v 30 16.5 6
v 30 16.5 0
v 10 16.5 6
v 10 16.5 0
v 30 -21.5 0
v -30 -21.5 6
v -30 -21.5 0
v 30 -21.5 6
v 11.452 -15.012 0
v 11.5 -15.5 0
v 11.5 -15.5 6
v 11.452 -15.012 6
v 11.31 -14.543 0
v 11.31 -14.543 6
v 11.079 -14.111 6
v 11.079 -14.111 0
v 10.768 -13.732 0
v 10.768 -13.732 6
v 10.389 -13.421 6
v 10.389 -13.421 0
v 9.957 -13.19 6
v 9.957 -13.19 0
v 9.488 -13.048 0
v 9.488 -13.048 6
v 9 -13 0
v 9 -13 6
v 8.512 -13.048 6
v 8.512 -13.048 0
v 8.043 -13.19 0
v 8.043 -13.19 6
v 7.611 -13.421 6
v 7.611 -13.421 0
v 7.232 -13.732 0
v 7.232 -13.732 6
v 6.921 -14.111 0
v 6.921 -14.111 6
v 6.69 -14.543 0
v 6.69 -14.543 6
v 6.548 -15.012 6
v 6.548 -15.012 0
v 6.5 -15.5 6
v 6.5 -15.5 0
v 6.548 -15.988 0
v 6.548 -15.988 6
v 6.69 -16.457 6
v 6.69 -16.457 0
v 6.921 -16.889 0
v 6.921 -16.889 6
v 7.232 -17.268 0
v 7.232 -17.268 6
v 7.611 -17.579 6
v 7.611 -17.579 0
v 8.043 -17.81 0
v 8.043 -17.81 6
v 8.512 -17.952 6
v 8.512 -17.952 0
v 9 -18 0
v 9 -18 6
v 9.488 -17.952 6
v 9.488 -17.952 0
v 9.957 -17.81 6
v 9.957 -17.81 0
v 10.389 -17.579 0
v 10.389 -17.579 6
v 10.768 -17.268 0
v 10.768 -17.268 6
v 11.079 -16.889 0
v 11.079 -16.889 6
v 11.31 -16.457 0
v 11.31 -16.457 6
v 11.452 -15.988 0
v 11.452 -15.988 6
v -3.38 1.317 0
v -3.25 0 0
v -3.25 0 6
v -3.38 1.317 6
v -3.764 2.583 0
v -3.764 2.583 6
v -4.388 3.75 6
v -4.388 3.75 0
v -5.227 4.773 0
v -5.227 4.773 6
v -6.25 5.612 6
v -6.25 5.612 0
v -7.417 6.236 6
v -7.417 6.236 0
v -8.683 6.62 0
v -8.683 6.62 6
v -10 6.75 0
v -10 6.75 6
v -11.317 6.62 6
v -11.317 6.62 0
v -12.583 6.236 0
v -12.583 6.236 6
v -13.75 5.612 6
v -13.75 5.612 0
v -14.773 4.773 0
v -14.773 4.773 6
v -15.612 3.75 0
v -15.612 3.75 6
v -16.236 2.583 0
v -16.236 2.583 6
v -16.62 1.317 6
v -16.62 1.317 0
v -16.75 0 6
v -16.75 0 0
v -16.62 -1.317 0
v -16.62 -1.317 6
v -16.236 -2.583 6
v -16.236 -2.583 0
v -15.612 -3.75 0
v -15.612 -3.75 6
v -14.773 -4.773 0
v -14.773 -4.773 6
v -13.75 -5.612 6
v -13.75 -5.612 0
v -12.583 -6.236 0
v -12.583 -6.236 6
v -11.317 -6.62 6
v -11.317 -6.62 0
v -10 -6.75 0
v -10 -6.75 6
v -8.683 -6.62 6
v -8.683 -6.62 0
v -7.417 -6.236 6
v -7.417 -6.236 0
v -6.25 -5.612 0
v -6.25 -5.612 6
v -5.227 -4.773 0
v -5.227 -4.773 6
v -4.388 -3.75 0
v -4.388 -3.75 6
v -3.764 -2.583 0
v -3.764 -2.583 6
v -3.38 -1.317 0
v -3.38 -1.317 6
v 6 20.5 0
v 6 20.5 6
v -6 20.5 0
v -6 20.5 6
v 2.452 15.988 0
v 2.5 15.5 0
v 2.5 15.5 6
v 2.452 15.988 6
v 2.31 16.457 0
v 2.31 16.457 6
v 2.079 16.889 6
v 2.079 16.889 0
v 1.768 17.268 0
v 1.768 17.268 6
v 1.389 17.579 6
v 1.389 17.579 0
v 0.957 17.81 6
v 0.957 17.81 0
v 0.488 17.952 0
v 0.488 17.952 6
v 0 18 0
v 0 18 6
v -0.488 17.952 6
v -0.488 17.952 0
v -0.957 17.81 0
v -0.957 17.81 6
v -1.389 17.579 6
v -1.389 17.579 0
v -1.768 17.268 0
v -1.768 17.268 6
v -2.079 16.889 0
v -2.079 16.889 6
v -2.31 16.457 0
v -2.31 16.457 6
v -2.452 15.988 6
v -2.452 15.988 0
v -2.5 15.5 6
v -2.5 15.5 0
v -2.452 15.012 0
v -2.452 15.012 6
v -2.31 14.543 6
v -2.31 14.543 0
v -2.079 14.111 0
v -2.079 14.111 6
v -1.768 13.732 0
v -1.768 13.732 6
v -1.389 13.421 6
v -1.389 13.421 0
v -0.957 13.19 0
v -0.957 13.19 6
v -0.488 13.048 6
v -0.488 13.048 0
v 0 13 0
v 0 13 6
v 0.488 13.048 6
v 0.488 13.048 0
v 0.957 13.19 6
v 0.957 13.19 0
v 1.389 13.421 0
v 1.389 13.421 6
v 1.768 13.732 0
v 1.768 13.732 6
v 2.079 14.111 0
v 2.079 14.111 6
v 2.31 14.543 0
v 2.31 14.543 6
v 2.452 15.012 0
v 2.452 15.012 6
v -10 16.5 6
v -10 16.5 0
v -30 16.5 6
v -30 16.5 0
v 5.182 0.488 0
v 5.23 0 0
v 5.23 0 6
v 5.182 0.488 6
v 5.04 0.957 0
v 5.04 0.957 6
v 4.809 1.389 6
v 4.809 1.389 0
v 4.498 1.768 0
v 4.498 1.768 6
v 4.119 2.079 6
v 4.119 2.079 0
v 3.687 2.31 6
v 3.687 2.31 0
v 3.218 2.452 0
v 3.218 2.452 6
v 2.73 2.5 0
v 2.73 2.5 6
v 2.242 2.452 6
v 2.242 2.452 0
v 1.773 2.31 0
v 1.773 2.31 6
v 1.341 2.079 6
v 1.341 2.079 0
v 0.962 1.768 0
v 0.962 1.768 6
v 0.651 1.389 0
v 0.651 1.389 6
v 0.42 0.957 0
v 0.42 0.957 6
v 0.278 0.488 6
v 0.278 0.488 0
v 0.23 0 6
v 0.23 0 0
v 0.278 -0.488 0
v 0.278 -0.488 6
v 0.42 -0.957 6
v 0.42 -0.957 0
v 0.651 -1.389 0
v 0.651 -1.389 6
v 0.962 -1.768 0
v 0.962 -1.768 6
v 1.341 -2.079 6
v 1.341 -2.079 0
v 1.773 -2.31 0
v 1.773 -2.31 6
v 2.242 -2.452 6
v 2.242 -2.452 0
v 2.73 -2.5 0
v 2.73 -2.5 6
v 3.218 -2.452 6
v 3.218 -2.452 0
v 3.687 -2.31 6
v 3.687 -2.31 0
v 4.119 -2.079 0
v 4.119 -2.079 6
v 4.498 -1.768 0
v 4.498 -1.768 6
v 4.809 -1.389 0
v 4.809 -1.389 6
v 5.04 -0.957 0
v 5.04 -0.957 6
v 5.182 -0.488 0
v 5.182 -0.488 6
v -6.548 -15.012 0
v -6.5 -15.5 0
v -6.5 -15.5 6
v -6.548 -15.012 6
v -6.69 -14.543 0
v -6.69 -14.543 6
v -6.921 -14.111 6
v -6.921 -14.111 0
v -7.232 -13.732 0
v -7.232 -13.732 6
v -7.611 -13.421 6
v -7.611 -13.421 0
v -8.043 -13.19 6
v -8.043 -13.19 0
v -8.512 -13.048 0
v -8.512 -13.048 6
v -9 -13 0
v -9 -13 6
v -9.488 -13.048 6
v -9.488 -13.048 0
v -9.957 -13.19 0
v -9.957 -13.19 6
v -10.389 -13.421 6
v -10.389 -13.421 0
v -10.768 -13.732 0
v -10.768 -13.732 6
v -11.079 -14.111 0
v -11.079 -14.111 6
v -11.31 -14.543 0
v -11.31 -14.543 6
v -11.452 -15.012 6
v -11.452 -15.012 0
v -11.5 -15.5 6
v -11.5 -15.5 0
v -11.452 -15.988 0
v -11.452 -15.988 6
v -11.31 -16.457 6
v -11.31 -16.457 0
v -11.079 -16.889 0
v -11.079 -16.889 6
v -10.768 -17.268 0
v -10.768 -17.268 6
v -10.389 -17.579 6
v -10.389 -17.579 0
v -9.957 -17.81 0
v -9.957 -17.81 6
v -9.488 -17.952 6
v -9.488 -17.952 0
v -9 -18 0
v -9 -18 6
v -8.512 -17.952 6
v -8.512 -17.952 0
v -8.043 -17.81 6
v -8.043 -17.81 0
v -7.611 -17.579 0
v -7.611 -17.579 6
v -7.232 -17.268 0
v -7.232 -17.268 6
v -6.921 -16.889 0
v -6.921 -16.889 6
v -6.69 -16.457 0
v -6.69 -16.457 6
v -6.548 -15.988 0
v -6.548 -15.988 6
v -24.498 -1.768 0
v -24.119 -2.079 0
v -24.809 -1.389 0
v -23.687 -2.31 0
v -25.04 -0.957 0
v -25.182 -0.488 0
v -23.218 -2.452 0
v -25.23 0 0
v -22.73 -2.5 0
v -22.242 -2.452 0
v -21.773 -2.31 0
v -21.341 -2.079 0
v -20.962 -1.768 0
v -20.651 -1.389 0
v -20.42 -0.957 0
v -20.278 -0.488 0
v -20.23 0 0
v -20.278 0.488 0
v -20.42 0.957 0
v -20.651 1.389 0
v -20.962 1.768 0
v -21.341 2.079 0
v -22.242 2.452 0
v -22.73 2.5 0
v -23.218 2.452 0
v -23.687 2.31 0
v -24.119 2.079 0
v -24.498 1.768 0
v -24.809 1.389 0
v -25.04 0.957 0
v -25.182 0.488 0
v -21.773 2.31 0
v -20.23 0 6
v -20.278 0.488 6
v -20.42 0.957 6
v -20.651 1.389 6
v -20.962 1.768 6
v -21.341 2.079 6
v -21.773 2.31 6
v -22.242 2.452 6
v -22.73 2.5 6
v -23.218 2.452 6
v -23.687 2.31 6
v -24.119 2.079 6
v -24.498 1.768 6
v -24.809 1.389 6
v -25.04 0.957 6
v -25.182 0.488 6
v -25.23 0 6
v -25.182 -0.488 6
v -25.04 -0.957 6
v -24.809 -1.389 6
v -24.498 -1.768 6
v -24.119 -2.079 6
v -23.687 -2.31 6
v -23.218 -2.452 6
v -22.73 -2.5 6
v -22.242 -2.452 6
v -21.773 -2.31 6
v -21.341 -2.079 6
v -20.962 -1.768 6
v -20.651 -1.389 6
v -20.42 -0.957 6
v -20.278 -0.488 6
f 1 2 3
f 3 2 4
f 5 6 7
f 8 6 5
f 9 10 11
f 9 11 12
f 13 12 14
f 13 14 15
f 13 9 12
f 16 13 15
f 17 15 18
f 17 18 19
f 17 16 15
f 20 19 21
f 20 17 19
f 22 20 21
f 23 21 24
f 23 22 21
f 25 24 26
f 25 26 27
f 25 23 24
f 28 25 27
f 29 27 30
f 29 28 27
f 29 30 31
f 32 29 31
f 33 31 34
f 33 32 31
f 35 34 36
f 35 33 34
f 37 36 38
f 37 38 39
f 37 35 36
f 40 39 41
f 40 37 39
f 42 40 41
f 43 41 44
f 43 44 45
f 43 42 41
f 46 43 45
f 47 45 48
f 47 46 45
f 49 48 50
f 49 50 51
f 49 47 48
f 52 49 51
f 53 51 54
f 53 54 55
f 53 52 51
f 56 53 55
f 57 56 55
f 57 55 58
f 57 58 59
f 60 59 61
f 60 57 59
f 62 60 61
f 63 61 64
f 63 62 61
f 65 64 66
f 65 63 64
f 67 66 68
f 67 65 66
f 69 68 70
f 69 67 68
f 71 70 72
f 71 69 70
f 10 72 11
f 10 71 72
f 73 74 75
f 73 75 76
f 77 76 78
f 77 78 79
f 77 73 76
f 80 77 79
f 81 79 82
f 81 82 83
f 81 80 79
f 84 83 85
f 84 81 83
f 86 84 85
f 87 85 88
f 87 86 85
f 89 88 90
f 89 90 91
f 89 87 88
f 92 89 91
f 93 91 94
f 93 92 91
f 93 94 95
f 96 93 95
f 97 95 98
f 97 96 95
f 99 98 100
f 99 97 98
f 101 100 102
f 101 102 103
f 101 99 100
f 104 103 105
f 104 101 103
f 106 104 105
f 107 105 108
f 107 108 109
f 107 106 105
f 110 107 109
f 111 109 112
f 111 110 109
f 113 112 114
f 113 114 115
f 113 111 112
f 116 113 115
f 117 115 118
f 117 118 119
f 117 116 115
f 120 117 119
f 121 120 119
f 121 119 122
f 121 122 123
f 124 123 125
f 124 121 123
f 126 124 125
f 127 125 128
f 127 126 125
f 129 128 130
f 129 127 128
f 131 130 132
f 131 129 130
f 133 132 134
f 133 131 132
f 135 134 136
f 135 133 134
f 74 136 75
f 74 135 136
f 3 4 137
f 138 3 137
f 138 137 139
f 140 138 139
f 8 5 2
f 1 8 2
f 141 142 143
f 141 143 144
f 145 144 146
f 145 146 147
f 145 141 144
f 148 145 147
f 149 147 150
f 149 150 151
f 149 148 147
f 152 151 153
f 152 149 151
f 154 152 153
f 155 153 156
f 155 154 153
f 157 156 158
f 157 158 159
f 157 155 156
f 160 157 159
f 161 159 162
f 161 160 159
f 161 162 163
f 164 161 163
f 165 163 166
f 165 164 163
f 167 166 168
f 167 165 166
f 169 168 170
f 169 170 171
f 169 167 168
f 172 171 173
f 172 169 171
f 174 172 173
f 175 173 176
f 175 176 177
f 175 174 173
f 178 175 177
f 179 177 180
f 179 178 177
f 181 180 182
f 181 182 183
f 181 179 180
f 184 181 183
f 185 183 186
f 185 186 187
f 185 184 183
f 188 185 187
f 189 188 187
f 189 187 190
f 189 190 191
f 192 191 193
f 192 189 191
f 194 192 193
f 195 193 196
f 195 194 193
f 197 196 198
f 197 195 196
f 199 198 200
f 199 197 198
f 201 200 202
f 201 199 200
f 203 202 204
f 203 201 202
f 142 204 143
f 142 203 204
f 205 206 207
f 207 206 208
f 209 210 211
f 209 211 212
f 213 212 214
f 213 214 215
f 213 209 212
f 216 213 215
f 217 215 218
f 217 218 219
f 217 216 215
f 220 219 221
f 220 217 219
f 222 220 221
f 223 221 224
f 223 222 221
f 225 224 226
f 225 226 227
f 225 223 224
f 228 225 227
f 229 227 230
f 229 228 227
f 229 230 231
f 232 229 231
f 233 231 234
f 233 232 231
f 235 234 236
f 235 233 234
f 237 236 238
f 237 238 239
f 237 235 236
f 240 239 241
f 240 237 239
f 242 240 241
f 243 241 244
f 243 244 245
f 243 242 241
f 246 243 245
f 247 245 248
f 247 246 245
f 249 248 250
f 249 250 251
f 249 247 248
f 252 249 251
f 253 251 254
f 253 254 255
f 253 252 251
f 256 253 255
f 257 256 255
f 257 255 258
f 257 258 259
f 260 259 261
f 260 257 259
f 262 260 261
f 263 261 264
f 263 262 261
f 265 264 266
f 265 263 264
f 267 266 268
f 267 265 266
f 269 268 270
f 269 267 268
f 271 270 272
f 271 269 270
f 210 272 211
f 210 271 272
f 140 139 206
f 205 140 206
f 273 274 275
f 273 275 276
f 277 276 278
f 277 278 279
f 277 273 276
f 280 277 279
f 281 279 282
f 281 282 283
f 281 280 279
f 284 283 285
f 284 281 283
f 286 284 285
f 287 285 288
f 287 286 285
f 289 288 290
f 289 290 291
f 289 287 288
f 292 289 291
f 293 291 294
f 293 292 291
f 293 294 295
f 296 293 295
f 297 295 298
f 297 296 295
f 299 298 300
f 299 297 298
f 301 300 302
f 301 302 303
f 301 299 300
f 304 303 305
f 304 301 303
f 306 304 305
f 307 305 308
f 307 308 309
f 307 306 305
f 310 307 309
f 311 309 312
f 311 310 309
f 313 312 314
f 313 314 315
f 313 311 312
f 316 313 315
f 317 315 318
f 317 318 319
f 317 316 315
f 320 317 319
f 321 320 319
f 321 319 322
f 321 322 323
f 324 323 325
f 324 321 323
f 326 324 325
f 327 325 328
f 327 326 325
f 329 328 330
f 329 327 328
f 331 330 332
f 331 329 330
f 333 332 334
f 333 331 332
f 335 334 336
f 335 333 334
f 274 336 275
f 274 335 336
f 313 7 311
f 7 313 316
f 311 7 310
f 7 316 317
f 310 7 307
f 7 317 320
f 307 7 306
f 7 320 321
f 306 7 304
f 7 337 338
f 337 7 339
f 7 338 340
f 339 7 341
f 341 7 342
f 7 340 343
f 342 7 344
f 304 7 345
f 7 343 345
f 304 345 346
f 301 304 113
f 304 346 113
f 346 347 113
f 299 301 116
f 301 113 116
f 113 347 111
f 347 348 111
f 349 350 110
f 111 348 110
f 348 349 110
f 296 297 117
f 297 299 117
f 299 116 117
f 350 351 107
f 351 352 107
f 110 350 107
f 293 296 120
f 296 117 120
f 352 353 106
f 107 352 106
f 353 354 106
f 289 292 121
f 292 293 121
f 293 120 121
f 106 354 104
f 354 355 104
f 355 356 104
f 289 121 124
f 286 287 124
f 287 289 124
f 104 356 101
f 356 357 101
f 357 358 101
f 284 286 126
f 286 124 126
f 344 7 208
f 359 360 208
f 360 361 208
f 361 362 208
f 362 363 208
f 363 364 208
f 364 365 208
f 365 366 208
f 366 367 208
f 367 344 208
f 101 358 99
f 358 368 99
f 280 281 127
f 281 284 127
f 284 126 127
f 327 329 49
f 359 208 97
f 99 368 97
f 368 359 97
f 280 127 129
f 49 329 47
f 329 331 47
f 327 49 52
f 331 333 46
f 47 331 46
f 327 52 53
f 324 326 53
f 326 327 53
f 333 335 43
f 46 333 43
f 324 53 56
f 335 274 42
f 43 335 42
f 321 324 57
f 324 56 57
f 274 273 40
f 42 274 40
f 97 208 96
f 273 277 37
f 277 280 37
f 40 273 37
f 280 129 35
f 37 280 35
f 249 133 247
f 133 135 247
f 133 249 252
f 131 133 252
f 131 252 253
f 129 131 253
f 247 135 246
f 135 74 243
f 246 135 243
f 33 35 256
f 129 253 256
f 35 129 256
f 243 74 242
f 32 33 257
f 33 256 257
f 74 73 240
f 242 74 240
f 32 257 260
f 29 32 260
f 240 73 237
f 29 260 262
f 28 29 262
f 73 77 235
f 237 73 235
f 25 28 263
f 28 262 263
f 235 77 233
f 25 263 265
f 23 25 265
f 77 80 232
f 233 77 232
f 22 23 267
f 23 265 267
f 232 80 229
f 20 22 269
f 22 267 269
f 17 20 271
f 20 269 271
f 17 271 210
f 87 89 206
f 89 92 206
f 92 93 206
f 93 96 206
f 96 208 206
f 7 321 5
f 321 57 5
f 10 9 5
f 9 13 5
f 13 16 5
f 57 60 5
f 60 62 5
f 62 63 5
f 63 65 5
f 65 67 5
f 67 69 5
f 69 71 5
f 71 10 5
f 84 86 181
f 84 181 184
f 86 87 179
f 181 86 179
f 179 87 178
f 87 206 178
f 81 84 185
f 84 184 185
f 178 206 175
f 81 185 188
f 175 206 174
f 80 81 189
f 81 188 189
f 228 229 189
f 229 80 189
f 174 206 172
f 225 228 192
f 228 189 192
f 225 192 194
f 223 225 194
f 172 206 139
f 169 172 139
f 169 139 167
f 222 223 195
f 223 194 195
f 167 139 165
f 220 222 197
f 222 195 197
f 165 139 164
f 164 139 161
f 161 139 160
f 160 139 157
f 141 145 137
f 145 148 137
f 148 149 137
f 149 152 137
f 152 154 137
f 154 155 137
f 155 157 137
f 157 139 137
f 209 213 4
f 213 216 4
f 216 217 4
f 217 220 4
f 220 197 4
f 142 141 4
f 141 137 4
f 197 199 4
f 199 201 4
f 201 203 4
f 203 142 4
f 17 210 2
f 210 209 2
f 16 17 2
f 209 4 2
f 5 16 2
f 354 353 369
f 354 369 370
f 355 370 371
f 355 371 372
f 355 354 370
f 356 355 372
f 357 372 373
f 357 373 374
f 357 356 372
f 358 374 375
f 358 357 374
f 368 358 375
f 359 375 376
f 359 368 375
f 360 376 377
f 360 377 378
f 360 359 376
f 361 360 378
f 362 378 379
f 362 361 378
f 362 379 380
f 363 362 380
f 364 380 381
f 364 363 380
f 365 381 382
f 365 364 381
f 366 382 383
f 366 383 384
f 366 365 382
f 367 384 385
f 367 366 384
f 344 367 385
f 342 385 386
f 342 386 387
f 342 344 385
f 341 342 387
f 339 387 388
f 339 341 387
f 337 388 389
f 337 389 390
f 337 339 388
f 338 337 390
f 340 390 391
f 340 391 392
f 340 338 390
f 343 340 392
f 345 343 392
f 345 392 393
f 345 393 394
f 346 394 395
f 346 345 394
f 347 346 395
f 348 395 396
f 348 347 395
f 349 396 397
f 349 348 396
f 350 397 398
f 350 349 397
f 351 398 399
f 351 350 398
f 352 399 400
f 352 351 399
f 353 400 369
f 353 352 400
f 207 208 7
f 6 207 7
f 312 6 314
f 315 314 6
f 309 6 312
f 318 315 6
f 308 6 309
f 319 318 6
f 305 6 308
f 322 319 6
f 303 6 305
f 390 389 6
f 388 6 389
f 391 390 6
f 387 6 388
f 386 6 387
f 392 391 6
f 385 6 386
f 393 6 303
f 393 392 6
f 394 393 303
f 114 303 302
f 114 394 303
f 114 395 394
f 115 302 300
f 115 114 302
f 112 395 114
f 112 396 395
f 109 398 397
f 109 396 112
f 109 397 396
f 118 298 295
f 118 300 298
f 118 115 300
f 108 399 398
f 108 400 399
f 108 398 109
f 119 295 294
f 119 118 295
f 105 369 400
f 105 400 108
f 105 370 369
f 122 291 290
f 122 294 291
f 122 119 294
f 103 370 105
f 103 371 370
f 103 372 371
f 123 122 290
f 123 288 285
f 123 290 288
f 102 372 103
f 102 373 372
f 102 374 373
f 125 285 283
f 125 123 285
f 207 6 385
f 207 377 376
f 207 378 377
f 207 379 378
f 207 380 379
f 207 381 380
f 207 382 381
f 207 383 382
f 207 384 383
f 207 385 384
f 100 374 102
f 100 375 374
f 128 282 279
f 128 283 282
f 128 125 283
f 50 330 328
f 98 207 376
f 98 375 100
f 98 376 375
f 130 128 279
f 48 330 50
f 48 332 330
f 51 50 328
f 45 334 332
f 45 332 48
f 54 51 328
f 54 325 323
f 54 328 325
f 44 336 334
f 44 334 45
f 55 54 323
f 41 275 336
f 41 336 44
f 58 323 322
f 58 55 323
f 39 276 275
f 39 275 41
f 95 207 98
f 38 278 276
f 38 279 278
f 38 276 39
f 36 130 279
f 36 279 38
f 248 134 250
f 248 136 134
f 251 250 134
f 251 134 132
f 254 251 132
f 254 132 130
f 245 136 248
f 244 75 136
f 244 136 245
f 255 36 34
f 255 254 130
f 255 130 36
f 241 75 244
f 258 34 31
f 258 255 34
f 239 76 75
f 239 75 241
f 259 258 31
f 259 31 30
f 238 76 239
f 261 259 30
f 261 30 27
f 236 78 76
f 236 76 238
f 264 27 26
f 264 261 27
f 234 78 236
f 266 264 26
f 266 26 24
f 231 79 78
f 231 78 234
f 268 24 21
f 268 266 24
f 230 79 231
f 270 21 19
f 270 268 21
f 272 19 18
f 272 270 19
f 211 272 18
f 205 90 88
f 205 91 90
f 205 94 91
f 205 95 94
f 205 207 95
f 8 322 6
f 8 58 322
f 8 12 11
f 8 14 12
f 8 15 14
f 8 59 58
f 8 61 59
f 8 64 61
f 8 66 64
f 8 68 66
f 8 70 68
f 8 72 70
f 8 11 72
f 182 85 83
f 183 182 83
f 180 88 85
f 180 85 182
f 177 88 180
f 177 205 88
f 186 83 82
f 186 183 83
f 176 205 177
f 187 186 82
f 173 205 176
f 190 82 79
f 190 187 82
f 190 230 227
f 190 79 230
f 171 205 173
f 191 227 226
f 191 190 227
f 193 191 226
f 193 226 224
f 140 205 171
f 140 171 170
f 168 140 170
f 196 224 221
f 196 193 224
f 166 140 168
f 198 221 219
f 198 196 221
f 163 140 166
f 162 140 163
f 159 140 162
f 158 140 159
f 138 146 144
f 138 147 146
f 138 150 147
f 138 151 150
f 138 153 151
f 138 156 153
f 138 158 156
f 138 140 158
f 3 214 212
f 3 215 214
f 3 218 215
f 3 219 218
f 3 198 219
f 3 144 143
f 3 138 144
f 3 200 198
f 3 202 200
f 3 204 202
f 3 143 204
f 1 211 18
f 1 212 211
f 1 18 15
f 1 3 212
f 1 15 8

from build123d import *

# Parameters (mm, degrees)
F0_R      = 2.5
F0_W      = 40
F0_H      = 21
F0_R_2    = 6.75
F1_DEPTH  = 6
F1_FACE_W = 60
F1_FACE_H = 6
F2_DEPTH  = 1


with BuildPart() as f1:
    # F0 (on Top) → F1 (new body)
    with BuildSketch(Plane.XY):
        Polygon((30, 16.5), (20, 16.5), (10, 16.5), (6, 20.5), (-6, 20.5), (-10, 16.5), (-20, 16.5), (-30, 16.5), (-30, 10.5), (-30, -10.5), (-30, -22.5), (-20, -22.5), (20, -22.5), (30, -22.5), (30, -10.5), (30, 10.5), align=None)
        with Locations((-9, -15.5)):
            Circle(F0_R, mode=Mode.SUBTRACT)
        with Locations((9, -15.5)):
            Circle(F0_R, mode=Mode.SUBTRACT)
        with Locations((-22.73, 0)):
            Circle(F0_R, mode=Mode.SUBTRACT)
        Rectangle(F0_W, F0_H, mode=Mode.SUBTRACT)
        with Locations((0, 15.5)):
            Circle(F0_R, mode=Mode.SUBTRACT)
        Rectangle(F0_W, F0_H)
        with Locations((-10, 0)):
            Circle(F0_R_2, mode=Mode.SUBTRACT)
        with Locations((2.73, 0)):
            Circle(F0_R, mode=Mode.SUBTRACT)
    extrude(amount=F1_DEPTH)

    # F1_face (on face) → F2 (cut)
    with BuildSketch(Plane(origin=(0, -22.5, 3), x_dir=(1, 0, 0), z_dir=(0, -1, 0))):
        Rectangle(F1_FACE_W, F1_FACE_H)
    extrude(amount=-F2_DEPTH, mode=Mode.SUBTRACT)


solid = f1.part
